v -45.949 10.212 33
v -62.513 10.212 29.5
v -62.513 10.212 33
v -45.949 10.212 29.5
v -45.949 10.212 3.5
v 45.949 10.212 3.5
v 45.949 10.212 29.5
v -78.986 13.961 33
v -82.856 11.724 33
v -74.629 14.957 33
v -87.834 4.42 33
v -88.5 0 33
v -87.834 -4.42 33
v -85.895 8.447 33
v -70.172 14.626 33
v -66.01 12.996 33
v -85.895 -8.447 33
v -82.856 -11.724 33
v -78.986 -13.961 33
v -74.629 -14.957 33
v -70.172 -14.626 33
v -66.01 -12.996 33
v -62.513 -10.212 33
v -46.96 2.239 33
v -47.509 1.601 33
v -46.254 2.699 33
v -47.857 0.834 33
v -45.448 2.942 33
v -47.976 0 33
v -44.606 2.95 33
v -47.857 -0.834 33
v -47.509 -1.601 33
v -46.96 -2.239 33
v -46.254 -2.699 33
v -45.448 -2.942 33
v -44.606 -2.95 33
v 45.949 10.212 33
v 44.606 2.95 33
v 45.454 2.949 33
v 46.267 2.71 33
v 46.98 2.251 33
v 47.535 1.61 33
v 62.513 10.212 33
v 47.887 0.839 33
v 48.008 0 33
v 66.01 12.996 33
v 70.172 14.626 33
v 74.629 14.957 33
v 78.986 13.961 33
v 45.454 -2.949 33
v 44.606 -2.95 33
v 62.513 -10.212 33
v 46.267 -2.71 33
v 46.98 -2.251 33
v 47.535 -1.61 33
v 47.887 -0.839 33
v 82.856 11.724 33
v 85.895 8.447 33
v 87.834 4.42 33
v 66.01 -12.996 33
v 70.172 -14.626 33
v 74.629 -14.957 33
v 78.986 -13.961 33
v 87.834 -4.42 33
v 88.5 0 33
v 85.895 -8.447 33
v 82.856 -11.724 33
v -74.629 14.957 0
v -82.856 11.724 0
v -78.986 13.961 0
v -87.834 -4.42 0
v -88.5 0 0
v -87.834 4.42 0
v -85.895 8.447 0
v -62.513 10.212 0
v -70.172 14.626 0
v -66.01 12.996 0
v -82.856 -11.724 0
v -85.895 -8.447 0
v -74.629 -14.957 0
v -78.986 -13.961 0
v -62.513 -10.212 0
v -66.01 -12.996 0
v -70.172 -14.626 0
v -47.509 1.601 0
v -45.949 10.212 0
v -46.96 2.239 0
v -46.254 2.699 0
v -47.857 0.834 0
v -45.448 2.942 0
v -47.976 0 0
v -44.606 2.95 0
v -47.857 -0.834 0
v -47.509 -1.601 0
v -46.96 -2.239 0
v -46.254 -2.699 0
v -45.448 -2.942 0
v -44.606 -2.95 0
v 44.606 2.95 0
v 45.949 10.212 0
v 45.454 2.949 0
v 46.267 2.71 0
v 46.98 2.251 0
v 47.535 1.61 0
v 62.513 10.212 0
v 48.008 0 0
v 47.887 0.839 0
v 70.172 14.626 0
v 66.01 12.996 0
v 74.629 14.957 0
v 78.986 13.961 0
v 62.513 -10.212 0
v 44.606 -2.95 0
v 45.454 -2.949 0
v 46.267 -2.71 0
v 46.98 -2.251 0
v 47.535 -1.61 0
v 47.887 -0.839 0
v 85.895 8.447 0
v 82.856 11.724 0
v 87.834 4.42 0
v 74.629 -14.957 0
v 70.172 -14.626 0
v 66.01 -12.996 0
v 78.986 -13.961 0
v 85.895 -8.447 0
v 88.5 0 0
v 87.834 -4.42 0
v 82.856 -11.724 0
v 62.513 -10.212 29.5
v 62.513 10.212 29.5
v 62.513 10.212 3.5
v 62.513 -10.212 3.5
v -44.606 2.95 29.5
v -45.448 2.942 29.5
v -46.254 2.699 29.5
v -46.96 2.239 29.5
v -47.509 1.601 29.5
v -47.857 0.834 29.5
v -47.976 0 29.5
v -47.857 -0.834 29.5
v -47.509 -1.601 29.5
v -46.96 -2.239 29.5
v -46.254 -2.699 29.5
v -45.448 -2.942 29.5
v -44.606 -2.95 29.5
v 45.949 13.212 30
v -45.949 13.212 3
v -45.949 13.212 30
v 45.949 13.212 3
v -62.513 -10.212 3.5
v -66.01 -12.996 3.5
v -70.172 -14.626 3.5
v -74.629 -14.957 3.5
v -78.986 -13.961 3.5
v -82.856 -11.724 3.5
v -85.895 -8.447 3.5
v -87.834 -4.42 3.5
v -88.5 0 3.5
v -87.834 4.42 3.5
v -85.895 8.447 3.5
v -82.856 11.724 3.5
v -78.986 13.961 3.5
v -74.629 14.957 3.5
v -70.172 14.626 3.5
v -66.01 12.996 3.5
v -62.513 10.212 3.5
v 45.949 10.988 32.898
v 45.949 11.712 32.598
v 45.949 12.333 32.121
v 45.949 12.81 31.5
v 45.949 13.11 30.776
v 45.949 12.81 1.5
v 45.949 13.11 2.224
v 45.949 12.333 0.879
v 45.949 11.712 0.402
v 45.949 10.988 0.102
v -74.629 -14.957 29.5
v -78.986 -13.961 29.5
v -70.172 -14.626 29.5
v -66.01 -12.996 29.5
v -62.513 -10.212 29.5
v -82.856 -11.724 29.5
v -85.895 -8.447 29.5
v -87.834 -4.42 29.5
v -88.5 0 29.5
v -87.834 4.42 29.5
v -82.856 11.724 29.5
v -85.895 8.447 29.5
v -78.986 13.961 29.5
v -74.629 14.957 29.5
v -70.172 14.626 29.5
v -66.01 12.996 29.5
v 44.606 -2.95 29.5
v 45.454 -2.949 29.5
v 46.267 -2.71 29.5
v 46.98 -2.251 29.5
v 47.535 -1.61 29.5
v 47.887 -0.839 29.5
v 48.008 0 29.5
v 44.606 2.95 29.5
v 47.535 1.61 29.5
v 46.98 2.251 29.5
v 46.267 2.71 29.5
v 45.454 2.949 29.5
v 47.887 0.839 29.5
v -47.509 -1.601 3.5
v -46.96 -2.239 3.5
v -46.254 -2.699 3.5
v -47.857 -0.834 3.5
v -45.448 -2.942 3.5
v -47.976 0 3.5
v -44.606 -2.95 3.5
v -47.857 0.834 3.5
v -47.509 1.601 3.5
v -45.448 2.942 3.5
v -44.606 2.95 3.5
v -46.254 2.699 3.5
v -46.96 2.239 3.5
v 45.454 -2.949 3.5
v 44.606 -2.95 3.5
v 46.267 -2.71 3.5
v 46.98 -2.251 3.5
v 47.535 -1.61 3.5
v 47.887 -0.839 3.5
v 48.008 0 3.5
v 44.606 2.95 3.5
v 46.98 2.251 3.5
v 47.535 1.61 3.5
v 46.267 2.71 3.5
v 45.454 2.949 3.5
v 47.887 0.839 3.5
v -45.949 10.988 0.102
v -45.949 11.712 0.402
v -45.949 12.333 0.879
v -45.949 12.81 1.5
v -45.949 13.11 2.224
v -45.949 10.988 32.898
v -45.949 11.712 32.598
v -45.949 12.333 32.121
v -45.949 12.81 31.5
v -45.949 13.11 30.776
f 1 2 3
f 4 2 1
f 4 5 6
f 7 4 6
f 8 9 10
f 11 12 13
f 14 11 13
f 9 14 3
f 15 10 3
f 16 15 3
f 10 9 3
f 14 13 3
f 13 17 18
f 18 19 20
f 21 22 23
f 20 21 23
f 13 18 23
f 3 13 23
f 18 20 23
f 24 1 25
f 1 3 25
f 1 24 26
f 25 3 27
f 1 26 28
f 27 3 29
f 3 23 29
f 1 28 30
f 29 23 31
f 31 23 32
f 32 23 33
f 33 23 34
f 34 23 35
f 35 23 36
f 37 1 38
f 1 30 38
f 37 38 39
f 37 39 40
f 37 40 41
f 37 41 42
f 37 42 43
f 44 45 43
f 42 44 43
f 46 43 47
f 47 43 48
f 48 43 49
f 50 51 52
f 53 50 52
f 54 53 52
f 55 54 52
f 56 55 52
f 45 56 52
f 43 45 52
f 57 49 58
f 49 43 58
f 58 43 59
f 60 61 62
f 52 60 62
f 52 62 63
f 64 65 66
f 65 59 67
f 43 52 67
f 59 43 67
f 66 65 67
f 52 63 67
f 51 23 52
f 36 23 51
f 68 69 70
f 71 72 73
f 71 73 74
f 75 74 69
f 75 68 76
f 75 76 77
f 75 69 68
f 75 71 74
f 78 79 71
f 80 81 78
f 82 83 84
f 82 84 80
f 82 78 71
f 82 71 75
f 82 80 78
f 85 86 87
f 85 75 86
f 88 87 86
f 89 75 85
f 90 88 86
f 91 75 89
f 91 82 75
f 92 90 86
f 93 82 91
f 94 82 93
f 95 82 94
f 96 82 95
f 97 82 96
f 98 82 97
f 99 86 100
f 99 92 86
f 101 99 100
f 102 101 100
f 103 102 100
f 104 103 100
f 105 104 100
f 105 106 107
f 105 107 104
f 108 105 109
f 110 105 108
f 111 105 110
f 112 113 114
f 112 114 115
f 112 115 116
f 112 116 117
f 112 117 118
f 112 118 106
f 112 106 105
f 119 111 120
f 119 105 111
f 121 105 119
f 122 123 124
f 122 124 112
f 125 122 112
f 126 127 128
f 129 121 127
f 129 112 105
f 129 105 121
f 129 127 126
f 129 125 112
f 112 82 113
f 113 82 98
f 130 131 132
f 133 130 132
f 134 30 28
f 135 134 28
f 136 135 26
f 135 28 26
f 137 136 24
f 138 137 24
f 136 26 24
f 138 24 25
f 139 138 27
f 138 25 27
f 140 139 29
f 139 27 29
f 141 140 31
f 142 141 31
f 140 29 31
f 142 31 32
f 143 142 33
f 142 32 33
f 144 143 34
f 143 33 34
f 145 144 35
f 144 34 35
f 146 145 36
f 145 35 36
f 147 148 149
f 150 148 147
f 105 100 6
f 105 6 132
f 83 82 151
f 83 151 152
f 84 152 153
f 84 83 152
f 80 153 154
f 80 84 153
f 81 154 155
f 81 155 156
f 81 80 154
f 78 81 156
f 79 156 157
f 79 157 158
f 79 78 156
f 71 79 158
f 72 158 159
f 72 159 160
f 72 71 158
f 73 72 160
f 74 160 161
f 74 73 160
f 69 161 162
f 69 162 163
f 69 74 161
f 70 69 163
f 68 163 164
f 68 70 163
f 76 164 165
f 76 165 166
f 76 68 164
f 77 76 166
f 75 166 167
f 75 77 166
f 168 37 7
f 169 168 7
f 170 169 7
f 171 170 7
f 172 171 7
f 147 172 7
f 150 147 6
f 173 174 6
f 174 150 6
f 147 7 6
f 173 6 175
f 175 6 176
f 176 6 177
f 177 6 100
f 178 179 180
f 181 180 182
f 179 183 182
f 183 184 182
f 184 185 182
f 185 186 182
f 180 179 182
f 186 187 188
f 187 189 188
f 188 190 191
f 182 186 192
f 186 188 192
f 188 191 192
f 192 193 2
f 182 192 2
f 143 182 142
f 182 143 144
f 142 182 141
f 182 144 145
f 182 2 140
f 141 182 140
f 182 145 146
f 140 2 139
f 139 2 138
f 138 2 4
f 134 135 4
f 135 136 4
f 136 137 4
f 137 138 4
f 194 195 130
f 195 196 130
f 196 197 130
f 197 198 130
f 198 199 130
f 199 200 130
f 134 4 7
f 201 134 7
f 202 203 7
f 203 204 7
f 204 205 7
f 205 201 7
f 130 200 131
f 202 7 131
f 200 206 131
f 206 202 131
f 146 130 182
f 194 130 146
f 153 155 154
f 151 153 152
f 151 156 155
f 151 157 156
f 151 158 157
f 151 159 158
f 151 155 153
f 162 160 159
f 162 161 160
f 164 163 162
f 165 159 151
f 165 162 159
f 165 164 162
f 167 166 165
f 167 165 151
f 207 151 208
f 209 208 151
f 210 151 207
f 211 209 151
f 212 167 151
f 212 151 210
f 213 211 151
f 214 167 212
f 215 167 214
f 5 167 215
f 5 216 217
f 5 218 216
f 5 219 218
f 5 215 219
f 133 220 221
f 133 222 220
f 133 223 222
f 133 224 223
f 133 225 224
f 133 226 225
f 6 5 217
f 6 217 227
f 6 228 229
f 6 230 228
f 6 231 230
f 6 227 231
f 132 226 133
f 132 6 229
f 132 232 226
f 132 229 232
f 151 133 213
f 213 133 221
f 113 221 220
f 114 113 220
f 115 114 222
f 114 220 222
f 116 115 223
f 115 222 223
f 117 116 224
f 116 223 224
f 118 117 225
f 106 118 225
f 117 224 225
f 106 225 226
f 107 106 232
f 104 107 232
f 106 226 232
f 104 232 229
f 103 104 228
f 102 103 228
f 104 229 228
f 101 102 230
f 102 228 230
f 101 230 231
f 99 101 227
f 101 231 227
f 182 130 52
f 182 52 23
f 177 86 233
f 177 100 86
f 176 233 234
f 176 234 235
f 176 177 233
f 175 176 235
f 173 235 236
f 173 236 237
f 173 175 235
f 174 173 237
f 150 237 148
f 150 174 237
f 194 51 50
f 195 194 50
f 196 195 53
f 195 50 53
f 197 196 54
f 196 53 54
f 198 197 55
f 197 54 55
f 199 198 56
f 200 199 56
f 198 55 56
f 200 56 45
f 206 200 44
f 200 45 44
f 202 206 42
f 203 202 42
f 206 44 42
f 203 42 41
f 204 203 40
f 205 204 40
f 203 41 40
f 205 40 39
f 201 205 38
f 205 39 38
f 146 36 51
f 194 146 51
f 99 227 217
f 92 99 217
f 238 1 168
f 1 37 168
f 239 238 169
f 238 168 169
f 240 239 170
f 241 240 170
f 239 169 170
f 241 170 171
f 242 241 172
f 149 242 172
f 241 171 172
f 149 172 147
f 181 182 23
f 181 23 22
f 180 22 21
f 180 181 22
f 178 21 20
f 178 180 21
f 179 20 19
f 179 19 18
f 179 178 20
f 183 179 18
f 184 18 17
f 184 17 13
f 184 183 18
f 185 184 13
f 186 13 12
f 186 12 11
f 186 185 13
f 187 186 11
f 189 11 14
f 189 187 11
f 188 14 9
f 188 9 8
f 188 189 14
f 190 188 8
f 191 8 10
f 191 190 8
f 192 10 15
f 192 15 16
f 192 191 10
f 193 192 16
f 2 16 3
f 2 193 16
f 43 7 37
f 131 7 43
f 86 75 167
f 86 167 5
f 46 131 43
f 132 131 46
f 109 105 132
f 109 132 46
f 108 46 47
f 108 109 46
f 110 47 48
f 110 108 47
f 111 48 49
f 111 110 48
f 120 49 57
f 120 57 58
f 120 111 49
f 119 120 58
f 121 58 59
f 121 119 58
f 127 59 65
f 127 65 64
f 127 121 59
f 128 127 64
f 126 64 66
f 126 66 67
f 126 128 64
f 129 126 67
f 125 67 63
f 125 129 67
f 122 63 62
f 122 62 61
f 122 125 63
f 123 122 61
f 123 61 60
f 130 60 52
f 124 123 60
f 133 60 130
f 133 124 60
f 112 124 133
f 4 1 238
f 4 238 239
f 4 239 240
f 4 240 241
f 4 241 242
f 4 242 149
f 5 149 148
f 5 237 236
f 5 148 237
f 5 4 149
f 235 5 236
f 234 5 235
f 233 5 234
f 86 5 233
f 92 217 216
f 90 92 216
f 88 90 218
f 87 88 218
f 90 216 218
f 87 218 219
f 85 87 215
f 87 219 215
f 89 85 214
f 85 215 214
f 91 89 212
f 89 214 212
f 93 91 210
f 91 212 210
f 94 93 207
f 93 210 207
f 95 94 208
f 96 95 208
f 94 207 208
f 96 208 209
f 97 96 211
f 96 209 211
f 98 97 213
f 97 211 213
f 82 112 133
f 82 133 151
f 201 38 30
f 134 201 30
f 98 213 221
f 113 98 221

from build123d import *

# Parameters (mm, degrees)
BOSS_EXTRUDE1_DEPTH     = 33
CUT_EXTRUDE1_DEPTH      = 60
SKETCH3_W               = 125.025821482
SKETCH3_H               = 26
CUT_EXTRUDE2_DEPTH      = 25
CUT_EXTRUDE6_DEPTH      = 98.759359099
CUT_EXTRUDE6_DEPTH_BACK = 98.759359099
SKETCH7_W               = 50
SKETCH7_H               = 26
SKETCH8_W               = 91.898790586
SKETCH8_H               = 33
BOSS_EXTRUDE2_DEPTH     = 3
FILLET1_R               = 3


with BuildPart() as part:
    # Sketch1 → Boss-Extrude1 (new body)
    with BuildSketch(Plane.XY):
        with BuildLine():
            Line((-62.512910741, 10.211947396), (62.512910741, 10.211947396))
            ThreePointArc((62.512910741, 10.211947396), (88.5, 0), (62.512910741, -10.211947396))
            Line((62.512910741, -10.211947396), (-62.512910741, -10.211947396))
            ThreePointArc((-62.512910741, -10.211947396), (-88.5, 0), (-62.512910741, 10.211947396))
        make_face()
    extrude(amount=BOSS_EXTRUDE1_DEPTH)

    # Sketch2 → Cut-Extrude1 (cut)
    with BuildSketch(Plane.XY.offset(43)):
        with BuildLine():
            Line((44.606109659, 2.95), (-44.606109659, 2.95))
            ThreePointArc((-44.606109659, 2.95), (-47.976180371, 0), (-44.606109659, -2.95))
            Line((-44.606109659, -2.95), (44.606109659, -2.95))
            ThreePointArc((44.606109659, -2.95), (48.007891593, 0), (44.606109659, 2.95))
        make_face()
    extrude(amount=-CUT_EXTRUDE1_DEPTH, mode=Mode.SUBTRACT)

    # Sketch3 → Cut-Extrude2 (cut)
    with BuildSketch(Plane(origin=(0, 10.211947396, 0), x_dir=(1, 0, 0), z_dir=(0, 1, 0))):
        with Locations((0, -16.5)):
            Rectangle(SKETCH3_W, SKETCH3_H)
    extrude(amount=-CUT_EXTRUDE2_DEPTH, mode=Mode.SUBTRACT)

    # Sketch7 → Cut-Extrude6 (cut, two sides: drawn at the far end of the back side and taken through both)
    with BuildSketch(Plane(origin=(0, 10.211947396, 0), x_dir=(-1, 0, 0), z_dir=(0, -1, 0)).offset(-CUT_EXTRUDE6_DEPTH_BACK)):
        with Locations((87.512910741, -16.5)):
            Rectangle(SKETCH7_W, SKETCH7_H)
    extrude(amount=CUT_EXTRUDE6_DEPTH + CUT_EXTRUDE6_DEPTH_BACK, mode=Mode.SUBTRACT)

    # Sketch8 → Boss-Extrude2 (add)
    with BuildSketch(Plane(origin=(0, 10.211947396, 0), x_dir=(1, 0, 0), z_dir=(0, 1, 0))):
        with Locations((0, -16.5)):
            Rectangle(SKETCH8_W, SKETCH8_H)
    extrude(amount=BOSS_EXTRUDE2_DEPTH)

    # Fillet1
    fillet1_edges = [part.edges().sort_by_distance(p)[0] for p in [
        (0, 13.211947396, 0),
        (0, 13.211947396, 33),
    ]]
    fillet(fillet1_edges, radius=FILLET1_R)


solid = part.part
